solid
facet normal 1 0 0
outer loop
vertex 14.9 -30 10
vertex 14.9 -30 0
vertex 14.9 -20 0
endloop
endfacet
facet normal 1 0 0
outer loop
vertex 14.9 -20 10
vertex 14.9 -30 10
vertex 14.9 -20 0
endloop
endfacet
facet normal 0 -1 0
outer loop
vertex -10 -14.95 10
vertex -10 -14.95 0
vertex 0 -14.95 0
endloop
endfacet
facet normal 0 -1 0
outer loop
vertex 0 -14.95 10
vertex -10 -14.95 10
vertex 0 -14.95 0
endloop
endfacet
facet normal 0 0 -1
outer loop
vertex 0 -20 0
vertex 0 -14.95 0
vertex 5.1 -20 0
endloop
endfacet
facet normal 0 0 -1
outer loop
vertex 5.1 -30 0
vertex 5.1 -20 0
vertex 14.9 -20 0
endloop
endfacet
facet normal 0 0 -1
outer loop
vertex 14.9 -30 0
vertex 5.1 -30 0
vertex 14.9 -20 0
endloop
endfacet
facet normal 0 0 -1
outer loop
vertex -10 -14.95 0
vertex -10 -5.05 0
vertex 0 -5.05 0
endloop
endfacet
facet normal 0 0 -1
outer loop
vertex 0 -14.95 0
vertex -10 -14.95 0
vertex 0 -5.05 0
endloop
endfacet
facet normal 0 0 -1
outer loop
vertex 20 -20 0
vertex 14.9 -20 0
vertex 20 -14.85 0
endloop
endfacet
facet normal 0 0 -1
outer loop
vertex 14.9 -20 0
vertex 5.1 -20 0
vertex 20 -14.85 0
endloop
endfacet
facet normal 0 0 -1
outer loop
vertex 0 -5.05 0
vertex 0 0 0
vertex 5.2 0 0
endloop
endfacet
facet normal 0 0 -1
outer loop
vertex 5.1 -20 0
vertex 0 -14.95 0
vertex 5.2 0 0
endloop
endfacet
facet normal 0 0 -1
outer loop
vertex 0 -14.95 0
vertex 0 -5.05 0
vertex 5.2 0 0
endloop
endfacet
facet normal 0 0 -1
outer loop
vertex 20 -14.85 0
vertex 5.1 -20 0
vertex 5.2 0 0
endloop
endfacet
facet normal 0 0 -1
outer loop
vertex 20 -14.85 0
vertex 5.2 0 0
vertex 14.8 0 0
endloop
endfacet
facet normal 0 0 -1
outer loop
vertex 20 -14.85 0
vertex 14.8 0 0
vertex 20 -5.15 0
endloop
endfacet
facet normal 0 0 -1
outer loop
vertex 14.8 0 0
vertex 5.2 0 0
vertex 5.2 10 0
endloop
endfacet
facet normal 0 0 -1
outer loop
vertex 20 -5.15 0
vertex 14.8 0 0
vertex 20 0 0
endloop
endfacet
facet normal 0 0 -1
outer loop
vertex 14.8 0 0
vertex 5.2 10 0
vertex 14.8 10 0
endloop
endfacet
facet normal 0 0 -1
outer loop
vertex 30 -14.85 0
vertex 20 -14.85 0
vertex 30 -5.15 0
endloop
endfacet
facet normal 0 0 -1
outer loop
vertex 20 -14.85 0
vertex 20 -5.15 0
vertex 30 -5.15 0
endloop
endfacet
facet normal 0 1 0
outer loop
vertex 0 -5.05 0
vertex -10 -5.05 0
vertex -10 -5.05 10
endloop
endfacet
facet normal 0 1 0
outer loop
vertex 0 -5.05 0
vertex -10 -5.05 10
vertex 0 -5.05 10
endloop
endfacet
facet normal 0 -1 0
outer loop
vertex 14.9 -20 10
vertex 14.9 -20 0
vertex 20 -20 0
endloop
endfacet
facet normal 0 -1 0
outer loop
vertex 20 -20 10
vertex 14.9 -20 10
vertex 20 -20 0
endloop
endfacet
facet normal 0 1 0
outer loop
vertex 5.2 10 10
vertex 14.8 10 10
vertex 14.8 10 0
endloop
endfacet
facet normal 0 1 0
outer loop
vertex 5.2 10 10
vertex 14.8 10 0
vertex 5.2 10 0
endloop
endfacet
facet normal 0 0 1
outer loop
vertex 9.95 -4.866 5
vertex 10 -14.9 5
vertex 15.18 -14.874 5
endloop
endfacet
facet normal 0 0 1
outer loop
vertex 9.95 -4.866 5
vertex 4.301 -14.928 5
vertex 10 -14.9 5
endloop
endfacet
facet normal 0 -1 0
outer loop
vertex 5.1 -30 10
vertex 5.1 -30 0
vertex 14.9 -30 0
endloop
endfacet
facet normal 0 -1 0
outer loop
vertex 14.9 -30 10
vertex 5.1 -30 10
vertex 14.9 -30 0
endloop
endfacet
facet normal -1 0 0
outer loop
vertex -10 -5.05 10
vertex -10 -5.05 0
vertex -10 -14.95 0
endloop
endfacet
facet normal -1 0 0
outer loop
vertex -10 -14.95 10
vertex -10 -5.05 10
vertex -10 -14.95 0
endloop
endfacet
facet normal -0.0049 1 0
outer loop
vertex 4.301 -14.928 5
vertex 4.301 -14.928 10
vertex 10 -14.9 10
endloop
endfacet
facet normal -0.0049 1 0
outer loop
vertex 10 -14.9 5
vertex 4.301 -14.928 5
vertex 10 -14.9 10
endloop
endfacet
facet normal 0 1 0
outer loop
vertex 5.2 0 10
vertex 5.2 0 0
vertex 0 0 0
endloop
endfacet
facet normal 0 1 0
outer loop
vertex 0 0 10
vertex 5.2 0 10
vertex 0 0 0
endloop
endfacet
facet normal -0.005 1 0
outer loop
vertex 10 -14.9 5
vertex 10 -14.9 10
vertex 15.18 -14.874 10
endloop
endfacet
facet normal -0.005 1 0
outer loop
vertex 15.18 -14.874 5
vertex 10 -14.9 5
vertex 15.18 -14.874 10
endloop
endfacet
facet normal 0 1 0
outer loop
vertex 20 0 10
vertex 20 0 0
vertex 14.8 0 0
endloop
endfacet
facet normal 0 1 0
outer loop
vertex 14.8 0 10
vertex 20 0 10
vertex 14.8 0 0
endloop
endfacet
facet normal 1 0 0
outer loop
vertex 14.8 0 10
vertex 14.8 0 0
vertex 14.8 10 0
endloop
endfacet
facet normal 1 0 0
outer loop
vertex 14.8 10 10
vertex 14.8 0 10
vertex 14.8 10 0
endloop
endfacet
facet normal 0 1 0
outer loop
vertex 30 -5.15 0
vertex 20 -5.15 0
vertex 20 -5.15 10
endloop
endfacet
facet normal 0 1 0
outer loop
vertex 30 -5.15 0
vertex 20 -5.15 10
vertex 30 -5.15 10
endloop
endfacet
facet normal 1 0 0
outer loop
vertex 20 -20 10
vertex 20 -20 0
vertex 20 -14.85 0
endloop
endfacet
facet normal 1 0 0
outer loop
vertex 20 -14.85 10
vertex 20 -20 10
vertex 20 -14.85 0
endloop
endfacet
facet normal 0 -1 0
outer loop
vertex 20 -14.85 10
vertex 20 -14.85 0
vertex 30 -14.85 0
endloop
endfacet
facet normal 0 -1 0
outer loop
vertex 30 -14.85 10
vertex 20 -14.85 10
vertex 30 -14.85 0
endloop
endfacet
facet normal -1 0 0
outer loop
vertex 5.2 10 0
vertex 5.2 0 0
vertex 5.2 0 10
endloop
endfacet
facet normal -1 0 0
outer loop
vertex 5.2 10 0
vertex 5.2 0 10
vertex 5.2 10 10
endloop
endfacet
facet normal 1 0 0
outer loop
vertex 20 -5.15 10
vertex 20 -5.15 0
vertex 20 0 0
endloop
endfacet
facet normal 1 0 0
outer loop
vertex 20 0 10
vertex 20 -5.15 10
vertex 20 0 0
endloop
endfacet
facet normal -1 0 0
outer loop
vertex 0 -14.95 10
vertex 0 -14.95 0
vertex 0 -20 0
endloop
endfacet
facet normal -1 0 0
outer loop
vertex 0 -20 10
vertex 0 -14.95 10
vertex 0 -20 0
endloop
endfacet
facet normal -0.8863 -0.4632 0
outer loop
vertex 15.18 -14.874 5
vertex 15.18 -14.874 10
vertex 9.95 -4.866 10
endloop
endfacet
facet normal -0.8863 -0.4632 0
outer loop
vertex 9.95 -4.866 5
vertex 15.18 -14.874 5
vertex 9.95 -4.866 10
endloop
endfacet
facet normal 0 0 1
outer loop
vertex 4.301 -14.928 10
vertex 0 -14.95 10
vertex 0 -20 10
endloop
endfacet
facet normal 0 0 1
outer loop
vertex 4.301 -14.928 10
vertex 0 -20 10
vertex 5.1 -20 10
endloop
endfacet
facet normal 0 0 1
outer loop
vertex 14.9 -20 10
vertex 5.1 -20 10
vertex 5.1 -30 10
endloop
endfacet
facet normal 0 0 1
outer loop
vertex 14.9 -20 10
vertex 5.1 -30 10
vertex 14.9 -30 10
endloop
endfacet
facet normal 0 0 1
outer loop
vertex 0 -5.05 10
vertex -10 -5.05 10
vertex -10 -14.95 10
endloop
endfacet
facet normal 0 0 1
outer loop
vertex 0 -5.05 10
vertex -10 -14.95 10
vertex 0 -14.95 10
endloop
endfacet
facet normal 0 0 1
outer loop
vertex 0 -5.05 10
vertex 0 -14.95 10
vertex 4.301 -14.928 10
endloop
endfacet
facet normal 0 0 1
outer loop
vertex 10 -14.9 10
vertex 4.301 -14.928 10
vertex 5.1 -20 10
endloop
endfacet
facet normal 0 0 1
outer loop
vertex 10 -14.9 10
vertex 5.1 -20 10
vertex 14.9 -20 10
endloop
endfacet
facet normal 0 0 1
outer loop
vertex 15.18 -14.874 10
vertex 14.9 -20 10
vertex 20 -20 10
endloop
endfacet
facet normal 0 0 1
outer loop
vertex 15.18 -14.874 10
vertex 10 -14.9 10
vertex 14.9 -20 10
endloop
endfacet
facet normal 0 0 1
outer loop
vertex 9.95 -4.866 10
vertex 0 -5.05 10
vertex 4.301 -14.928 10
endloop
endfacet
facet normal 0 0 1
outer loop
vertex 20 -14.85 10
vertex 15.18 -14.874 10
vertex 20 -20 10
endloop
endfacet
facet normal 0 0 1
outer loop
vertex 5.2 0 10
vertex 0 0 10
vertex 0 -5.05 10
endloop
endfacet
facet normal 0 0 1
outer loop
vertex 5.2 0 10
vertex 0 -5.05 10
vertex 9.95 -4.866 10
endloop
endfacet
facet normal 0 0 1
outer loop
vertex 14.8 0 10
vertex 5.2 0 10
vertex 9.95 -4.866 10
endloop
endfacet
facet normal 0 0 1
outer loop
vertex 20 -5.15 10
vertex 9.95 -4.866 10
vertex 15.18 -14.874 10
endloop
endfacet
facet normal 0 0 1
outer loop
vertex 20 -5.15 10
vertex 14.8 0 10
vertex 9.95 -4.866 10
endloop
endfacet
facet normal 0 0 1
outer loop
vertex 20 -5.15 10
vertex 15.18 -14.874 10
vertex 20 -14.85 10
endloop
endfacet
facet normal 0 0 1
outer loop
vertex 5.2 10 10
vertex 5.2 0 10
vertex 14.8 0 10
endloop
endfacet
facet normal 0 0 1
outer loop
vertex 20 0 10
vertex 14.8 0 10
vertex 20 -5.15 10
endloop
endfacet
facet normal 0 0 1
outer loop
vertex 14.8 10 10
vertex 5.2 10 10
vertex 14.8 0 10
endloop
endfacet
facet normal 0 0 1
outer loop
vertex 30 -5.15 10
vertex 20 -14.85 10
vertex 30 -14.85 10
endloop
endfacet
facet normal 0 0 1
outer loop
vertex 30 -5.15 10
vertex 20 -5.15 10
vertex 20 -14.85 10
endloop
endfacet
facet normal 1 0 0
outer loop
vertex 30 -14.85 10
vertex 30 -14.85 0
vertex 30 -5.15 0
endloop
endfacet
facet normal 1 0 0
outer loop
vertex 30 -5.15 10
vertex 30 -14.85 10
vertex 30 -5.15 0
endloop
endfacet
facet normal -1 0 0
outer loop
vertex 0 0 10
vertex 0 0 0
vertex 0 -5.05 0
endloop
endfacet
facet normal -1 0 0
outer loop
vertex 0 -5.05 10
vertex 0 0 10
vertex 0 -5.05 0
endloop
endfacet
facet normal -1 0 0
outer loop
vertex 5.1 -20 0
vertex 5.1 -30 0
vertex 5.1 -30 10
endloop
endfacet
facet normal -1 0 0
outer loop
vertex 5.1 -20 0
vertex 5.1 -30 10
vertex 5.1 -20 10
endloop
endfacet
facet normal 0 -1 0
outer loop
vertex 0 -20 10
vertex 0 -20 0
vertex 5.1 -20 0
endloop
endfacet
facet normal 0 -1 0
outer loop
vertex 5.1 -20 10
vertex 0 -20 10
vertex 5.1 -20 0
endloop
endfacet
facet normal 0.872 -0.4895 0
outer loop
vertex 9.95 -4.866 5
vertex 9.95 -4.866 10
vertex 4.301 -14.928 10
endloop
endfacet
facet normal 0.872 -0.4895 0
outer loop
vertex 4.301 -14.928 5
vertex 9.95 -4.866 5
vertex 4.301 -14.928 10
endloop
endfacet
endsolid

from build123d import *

# Parameters (mm, degrees)
F0_W     = 4.8
F0_H     = 10
F0_W_2   = 10
F0_H_2   = 4.95
F0_H_3   = 4.85
F0_W_3   = 4.9
F1_DEPTH = 10
F3_DEPTH = 5


with BuildPart() as f1:
    # F0 (on Top) → F1 (new body)
    with BuildSketch(Plane.XY):
        Polygon((5.2, 0), (0, 0), (0, -5.05), (0, -10), (0, -14.95), (0, -20), (5.1, -20), (10, -20), (14.9, -20), (20, -20), (20, -14.85), (20, -10), (20, -5.15), (20, 0), (14.8, 0), (10, 0), align=None)
        with Locations((7.6, 5)):
            Rectangle(F0_W, F0_H)
        with Locations((-5, -7.525)):
            Rectangle(F0_W_2, F0_H_2)
        with Locations((12.4, 5)):
            Rectangle(F0_W, F0_H)
        with Locations((-5, -12.475)):
            Rectangle(F0_W_2, F0_H_2)
        with Locations((25, -7.575)):
            Rectangle(F0_W_2, F0_H_3)
        with Locations((7.55, -25)):
            Rectangle(F0_W_3, F0_H)
        with Locations((25, -12.425)):
            Rectangle(F0_W_2, F0_H_3)
        with Locations((12.45, -25)):
            Rectangle(F0_W_3, F0_H)
    extrude(amount=F1_DEPTH)

    # F2 (on face) → F3 (cut)
    with BuildSketch(Plane.XY.offset(10)):
        Polygon((10, -14.9), (15.18014, -14.874099), (9.949831, -4.866128), align=None)
        Polygon((4.301277, -14.928494), (10, -14.9), (9.949831, -4.866128), align=None)
    extrude(amount=-F3_DEPTH, mode=Mode.SUBTRACT)


solid = f1.part
